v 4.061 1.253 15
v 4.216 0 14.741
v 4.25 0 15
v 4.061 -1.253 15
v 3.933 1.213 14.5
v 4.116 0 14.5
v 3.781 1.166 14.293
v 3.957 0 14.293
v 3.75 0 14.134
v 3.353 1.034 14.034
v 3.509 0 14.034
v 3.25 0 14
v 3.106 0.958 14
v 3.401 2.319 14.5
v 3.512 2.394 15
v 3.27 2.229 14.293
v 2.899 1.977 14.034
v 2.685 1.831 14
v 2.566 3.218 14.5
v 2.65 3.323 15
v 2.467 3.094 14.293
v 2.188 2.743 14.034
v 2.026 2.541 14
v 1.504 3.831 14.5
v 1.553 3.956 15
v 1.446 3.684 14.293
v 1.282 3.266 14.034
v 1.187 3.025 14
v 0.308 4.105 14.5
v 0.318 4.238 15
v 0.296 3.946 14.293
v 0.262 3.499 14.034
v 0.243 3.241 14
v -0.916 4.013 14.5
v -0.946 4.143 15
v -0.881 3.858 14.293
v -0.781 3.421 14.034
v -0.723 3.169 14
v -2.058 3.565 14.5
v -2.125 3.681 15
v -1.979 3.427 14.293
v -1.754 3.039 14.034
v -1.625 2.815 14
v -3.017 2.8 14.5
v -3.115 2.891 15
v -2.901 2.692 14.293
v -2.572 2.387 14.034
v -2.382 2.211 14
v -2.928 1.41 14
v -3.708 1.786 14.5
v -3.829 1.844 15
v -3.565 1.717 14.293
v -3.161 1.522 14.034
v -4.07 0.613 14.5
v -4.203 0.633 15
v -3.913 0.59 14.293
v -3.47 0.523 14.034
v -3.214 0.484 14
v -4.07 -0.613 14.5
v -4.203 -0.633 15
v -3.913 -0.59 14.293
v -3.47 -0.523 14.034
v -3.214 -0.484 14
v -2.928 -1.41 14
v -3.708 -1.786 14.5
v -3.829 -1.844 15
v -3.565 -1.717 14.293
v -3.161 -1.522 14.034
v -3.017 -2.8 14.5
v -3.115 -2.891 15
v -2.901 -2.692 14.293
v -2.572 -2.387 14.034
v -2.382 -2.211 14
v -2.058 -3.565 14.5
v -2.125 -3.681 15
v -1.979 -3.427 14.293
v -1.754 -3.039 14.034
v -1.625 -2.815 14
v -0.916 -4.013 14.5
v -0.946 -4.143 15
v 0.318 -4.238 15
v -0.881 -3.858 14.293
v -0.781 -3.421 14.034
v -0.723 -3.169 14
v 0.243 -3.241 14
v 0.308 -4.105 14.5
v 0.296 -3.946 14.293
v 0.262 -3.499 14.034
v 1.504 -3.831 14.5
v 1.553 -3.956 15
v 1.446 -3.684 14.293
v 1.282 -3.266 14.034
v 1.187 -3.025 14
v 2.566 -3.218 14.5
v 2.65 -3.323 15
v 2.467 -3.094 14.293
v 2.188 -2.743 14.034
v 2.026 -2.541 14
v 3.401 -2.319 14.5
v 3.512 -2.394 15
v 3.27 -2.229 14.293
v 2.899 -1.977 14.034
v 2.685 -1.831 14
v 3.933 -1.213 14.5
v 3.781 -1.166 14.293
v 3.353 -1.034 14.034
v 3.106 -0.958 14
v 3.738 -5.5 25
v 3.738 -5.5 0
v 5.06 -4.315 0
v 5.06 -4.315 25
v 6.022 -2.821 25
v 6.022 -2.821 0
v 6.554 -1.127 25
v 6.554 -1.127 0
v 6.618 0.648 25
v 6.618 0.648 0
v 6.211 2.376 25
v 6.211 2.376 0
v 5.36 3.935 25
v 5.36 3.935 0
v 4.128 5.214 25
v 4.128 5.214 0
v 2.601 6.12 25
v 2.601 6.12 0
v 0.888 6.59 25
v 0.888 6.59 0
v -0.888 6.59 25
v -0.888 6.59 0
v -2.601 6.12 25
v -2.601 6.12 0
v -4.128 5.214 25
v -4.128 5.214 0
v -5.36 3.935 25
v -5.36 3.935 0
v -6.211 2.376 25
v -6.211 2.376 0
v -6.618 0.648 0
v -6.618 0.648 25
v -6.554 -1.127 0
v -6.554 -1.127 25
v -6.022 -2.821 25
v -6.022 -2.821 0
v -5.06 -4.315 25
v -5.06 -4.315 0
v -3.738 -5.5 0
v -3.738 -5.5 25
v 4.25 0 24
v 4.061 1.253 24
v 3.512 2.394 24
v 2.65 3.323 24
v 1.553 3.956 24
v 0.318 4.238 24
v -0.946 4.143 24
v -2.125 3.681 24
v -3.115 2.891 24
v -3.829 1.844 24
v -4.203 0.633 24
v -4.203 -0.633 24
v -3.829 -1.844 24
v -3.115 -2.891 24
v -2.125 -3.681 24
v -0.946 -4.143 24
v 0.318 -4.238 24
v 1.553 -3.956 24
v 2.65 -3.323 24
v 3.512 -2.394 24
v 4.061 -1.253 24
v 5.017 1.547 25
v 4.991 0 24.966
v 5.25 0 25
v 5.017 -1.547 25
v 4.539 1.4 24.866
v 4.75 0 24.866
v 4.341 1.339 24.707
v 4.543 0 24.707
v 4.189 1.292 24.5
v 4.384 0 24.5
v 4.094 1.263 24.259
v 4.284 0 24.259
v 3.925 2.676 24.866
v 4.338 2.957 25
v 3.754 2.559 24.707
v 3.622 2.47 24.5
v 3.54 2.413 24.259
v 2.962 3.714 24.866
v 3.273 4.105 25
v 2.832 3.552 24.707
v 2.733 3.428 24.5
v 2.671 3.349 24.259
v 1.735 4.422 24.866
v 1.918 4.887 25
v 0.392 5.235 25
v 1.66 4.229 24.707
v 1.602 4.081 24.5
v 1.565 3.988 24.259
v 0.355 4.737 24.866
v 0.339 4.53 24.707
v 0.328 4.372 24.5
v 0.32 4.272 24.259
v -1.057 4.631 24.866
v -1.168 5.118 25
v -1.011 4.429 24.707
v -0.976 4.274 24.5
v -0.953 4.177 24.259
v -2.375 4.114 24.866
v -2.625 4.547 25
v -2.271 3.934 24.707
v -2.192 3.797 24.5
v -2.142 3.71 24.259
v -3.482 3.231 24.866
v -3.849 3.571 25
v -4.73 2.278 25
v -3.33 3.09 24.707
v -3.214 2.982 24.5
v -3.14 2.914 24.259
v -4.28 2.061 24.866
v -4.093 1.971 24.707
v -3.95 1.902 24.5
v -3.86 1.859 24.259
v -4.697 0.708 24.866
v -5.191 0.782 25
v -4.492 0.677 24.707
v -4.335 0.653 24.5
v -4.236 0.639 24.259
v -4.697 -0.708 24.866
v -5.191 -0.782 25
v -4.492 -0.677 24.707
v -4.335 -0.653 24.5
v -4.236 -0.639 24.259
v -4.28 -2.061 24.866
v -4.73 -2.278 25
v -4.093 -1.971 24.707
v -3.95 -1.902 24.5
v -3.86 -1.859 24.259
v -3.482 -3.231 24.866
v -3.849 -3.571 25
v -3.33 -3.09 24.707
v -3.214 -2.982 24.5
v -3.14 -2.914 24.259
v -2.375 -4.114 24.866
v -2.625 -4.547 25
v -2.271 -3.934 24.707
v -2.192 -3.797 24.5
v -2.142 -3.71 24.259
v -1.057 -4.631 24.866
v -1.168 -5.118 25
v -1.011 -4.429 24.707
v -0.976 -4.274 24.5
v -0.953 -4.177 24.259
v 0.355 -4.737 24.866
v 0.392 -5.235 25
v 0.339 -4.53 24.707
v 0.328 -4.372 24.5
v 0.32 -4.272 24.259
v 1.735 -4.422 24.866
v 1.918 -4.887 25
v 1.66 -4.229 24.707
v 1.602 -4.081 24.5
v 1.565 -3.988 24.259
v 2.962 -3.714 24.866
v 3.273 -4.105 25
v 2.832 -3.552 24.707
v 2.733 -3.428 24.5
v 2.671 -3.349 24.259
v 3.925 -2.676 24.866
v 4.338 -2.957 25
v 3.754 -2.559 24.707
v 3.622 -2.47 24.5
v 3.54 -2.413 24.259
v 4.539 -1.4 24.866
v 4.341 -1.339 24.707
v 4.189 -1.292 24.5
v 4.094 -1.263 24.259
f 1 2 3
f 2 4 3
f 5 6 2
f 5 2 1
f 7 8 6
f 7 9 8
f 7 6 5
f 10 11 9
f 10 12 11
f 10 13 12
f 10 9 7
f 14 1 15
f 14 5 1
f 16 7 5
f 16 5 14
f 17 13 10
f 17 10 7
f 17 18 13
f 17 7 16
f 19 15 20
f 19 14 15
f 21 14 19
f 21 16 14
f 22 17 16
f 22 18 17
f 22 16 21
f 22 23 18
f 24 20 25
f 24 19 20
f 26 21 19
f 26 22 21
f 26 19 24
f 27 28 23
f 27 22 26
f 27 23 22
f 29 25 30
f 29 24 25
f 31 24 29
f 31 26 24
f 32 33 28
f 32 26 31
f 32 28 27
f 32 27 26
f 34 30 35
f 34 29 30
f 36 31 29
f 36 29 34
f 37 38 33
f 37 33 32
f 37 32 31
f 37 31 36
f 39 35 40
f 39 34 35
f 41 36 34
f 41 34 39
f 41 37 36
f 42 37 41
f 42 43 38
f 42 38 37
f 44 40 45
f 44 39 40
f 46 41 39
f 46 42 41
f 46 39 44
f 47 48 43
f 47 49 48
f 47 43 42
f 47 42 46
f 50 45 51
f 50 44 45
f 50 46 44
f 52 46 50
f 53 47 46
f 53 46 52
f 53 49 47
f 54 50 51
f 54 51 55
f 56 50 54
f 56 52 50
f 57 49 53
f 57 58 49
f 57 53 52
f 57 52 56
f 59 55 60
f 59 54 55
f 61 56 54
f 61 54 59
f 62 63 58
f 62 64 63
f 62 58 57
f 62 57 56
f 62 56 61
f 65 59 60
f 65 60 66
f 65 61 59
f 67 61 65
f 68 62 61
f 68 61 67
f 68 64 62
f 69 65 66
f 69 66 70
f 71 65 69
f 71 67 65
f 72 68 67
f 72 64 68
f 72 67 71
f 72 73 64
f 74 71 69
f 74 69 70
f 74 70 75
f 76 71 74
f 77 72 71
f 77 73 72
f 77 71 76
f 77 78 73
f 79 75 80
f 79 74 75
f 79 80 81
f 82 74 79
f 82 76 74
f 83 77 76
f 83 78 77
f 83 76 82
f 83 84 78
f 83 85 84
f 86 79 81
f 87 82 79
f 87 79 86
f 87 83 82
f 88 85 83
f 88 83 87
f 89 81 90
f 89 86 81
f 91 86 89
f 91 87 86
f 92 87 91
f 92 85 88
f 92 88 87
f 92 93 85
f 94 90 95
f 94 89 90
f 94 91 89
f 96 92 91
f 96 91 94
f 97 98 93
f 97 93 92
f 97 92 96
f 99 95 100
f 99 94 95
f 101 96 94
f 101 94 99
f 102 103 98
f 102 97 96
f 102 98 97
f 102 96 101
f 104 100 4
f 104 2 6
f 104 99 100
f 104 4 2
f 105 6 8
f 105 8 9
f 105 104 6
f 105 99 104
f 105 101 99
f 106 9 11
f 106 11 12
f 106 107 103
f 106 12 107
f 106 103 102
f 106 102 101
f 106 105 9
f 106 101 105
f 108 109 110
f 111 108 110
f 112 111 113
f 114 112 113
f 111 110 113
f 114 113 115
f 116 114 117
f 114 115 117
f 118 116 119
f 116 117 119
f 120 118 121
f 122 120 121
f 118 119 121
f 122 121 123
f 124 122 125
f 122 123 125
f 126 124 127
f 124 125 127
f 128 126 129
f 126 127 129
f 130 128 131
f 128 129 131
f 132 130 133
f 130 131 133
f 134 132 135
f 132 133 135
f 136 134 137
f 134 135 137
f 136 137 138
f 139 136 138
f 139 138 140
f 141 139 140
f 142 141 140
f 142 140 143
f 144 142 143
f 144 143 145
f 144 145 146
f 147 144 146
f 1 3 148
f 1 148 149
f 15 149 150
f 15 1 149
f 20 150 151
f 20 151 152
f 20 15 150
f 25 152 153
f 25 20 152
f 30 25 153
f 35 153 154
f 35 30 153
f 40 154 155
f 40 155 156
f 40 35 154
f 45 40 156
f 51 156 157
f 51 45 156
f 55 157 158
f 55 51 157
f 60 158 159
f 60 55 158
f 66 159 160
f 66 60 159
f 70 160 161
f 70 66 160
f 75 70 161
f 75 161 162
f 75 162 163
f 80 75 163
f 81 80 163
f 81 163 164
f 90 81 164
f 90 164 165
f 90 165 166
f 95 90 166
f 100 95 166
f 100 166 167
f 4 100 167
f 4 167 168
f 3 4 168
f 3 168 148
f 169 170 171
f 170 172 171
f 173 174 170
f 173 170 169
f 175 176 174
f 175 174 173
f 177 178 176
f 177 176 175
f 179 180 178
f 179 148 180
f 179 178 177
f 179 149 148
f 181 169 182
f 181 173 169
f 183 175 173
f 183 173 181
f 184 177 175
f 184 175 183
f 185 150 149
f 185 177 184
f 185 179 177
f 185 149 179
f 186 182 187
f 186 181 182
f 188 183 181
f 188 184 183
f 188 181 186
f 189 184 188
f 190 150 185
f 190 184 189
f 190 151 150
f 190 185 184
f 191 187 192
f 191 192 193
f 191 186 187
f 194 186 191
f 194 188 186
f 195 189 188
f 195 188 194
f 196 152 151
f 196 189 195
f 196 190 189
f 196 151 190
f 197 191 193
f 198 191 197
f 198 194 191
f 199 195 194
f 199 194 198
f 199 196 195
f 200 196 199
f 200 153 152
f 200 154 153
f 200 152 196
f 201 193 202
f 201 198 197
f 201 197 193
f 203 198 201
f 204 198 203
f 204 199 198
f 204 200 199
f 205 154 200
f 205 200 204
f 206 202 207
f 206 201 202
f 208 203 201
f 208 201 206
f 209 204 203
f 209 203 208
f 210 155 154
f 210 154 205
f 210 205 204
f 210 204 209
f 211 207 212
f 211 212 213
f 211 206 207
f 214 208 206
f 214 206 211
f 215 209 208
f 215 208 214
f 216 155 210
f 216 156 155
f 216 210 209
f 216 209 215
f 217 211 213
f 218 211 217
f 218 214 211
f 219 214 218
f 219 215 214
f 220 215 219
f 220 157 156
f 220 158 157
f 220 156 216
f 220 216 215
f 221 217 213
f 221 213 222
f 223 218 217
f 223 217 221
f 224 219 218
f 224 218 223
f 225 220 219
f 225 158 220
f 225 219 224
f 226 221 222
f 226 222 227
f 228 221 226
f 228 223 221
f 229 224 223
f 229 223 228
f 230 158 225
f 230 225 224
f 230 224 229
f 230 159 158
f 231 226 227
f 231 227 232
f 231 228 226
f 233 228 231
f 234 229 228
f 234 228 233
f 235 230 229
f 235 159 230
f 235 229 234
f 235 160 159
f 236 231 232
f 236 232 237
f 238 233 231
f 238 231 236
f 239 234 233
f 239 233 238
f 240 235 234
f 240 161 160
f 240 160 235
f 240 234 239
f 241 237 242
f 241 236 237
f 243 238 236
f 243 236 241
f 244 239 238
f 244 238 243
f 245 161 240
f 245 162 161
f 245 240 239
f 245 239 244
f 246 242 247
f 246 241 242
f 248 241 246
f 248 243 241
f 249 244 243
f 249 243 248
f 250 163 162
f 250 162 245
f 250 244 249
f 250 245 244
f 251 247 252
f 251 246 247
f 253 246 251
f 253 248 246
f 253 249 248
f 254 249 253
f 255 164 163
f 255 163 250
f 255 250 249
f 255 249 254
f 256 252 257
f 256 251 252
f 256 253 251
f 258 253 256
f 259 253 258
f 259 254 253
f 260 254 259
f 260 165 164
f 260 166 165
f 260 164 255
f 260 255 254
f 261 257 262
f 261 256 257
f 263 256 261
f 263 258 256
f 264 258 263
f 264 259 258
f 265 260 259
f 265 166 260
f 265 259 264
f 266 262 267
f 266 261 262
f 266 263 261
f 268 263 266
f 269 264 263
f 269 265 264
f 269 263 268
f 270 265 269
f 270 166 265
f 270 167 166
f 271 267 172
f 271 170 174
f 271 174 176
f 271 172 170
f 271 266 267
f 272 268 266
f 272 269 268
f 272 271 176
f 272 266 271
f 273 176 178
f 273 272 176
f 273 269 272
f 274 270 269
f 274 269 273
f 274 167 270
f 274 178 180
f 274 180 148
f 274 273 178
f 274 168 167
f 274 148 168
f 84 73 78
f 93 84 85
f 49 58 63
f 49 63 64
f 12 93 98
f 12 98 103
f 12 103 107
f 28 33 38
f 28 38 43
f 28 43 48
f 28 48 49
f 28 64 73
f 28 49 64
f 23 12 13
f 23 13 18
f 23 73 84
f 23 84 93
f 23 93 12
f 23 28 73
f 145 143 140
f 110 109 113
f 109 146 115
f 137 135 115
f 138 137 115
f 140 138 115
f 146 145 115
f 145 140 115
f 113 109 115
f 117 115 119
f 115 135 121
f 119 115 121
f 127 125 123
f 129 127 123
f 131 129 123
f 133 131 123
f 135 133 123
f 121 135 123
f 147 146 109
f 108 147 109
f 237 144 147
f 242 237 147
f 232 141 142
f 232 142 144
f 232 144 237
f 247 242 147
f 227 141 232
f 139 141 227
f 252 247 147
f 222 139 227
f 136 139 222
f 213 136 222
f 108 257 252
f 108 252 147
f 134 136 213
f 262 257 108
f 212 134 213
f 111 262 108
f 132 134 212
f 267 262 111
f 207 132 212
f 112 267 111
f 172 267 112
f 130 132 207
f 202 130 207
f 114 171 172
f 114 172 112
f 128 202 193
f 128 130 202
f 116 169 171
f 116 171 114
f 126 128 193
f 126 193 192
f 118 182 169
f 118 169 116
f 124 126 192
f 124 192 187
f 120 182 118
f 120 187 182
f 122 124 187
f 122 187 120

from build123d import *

# Parameters (mm, degrees)
F0_R     = 4.25
F1_DEPTH = 14
F2_DEPTH = 25
F3_R     = 1


with BuildPart() as f1:
    # F0 (on Top) → F1 (new body)
    with BuildSketch(Plane.XY):
        Circle(F0_R)
    extrude(amount=F1_DEPTH)

    # F0 (on Top) → F2 (join)
    with BuildSketch(Plane.XY):
        with BuildLine():
            Line((-3.737981, -5.5), (3.737981, -5.5))
            ThreePointArc((3.737981, -5.5), (0, 6.65), (-3.737981, -5.5))
        make_face()
        Circle(F0_R, mode=Mode.SUBTRACT)
    extrude(amount=F2_DEPTH)

    # F3
    f3_edges = [f1.edges().sort_by_distance(p)[0] for p in [
        (-4.25, 0, 14),
        (-4.25, 0, 25),
    ]]
    fillet(f3_edges, radius=F3_R)


solid = f1.part
